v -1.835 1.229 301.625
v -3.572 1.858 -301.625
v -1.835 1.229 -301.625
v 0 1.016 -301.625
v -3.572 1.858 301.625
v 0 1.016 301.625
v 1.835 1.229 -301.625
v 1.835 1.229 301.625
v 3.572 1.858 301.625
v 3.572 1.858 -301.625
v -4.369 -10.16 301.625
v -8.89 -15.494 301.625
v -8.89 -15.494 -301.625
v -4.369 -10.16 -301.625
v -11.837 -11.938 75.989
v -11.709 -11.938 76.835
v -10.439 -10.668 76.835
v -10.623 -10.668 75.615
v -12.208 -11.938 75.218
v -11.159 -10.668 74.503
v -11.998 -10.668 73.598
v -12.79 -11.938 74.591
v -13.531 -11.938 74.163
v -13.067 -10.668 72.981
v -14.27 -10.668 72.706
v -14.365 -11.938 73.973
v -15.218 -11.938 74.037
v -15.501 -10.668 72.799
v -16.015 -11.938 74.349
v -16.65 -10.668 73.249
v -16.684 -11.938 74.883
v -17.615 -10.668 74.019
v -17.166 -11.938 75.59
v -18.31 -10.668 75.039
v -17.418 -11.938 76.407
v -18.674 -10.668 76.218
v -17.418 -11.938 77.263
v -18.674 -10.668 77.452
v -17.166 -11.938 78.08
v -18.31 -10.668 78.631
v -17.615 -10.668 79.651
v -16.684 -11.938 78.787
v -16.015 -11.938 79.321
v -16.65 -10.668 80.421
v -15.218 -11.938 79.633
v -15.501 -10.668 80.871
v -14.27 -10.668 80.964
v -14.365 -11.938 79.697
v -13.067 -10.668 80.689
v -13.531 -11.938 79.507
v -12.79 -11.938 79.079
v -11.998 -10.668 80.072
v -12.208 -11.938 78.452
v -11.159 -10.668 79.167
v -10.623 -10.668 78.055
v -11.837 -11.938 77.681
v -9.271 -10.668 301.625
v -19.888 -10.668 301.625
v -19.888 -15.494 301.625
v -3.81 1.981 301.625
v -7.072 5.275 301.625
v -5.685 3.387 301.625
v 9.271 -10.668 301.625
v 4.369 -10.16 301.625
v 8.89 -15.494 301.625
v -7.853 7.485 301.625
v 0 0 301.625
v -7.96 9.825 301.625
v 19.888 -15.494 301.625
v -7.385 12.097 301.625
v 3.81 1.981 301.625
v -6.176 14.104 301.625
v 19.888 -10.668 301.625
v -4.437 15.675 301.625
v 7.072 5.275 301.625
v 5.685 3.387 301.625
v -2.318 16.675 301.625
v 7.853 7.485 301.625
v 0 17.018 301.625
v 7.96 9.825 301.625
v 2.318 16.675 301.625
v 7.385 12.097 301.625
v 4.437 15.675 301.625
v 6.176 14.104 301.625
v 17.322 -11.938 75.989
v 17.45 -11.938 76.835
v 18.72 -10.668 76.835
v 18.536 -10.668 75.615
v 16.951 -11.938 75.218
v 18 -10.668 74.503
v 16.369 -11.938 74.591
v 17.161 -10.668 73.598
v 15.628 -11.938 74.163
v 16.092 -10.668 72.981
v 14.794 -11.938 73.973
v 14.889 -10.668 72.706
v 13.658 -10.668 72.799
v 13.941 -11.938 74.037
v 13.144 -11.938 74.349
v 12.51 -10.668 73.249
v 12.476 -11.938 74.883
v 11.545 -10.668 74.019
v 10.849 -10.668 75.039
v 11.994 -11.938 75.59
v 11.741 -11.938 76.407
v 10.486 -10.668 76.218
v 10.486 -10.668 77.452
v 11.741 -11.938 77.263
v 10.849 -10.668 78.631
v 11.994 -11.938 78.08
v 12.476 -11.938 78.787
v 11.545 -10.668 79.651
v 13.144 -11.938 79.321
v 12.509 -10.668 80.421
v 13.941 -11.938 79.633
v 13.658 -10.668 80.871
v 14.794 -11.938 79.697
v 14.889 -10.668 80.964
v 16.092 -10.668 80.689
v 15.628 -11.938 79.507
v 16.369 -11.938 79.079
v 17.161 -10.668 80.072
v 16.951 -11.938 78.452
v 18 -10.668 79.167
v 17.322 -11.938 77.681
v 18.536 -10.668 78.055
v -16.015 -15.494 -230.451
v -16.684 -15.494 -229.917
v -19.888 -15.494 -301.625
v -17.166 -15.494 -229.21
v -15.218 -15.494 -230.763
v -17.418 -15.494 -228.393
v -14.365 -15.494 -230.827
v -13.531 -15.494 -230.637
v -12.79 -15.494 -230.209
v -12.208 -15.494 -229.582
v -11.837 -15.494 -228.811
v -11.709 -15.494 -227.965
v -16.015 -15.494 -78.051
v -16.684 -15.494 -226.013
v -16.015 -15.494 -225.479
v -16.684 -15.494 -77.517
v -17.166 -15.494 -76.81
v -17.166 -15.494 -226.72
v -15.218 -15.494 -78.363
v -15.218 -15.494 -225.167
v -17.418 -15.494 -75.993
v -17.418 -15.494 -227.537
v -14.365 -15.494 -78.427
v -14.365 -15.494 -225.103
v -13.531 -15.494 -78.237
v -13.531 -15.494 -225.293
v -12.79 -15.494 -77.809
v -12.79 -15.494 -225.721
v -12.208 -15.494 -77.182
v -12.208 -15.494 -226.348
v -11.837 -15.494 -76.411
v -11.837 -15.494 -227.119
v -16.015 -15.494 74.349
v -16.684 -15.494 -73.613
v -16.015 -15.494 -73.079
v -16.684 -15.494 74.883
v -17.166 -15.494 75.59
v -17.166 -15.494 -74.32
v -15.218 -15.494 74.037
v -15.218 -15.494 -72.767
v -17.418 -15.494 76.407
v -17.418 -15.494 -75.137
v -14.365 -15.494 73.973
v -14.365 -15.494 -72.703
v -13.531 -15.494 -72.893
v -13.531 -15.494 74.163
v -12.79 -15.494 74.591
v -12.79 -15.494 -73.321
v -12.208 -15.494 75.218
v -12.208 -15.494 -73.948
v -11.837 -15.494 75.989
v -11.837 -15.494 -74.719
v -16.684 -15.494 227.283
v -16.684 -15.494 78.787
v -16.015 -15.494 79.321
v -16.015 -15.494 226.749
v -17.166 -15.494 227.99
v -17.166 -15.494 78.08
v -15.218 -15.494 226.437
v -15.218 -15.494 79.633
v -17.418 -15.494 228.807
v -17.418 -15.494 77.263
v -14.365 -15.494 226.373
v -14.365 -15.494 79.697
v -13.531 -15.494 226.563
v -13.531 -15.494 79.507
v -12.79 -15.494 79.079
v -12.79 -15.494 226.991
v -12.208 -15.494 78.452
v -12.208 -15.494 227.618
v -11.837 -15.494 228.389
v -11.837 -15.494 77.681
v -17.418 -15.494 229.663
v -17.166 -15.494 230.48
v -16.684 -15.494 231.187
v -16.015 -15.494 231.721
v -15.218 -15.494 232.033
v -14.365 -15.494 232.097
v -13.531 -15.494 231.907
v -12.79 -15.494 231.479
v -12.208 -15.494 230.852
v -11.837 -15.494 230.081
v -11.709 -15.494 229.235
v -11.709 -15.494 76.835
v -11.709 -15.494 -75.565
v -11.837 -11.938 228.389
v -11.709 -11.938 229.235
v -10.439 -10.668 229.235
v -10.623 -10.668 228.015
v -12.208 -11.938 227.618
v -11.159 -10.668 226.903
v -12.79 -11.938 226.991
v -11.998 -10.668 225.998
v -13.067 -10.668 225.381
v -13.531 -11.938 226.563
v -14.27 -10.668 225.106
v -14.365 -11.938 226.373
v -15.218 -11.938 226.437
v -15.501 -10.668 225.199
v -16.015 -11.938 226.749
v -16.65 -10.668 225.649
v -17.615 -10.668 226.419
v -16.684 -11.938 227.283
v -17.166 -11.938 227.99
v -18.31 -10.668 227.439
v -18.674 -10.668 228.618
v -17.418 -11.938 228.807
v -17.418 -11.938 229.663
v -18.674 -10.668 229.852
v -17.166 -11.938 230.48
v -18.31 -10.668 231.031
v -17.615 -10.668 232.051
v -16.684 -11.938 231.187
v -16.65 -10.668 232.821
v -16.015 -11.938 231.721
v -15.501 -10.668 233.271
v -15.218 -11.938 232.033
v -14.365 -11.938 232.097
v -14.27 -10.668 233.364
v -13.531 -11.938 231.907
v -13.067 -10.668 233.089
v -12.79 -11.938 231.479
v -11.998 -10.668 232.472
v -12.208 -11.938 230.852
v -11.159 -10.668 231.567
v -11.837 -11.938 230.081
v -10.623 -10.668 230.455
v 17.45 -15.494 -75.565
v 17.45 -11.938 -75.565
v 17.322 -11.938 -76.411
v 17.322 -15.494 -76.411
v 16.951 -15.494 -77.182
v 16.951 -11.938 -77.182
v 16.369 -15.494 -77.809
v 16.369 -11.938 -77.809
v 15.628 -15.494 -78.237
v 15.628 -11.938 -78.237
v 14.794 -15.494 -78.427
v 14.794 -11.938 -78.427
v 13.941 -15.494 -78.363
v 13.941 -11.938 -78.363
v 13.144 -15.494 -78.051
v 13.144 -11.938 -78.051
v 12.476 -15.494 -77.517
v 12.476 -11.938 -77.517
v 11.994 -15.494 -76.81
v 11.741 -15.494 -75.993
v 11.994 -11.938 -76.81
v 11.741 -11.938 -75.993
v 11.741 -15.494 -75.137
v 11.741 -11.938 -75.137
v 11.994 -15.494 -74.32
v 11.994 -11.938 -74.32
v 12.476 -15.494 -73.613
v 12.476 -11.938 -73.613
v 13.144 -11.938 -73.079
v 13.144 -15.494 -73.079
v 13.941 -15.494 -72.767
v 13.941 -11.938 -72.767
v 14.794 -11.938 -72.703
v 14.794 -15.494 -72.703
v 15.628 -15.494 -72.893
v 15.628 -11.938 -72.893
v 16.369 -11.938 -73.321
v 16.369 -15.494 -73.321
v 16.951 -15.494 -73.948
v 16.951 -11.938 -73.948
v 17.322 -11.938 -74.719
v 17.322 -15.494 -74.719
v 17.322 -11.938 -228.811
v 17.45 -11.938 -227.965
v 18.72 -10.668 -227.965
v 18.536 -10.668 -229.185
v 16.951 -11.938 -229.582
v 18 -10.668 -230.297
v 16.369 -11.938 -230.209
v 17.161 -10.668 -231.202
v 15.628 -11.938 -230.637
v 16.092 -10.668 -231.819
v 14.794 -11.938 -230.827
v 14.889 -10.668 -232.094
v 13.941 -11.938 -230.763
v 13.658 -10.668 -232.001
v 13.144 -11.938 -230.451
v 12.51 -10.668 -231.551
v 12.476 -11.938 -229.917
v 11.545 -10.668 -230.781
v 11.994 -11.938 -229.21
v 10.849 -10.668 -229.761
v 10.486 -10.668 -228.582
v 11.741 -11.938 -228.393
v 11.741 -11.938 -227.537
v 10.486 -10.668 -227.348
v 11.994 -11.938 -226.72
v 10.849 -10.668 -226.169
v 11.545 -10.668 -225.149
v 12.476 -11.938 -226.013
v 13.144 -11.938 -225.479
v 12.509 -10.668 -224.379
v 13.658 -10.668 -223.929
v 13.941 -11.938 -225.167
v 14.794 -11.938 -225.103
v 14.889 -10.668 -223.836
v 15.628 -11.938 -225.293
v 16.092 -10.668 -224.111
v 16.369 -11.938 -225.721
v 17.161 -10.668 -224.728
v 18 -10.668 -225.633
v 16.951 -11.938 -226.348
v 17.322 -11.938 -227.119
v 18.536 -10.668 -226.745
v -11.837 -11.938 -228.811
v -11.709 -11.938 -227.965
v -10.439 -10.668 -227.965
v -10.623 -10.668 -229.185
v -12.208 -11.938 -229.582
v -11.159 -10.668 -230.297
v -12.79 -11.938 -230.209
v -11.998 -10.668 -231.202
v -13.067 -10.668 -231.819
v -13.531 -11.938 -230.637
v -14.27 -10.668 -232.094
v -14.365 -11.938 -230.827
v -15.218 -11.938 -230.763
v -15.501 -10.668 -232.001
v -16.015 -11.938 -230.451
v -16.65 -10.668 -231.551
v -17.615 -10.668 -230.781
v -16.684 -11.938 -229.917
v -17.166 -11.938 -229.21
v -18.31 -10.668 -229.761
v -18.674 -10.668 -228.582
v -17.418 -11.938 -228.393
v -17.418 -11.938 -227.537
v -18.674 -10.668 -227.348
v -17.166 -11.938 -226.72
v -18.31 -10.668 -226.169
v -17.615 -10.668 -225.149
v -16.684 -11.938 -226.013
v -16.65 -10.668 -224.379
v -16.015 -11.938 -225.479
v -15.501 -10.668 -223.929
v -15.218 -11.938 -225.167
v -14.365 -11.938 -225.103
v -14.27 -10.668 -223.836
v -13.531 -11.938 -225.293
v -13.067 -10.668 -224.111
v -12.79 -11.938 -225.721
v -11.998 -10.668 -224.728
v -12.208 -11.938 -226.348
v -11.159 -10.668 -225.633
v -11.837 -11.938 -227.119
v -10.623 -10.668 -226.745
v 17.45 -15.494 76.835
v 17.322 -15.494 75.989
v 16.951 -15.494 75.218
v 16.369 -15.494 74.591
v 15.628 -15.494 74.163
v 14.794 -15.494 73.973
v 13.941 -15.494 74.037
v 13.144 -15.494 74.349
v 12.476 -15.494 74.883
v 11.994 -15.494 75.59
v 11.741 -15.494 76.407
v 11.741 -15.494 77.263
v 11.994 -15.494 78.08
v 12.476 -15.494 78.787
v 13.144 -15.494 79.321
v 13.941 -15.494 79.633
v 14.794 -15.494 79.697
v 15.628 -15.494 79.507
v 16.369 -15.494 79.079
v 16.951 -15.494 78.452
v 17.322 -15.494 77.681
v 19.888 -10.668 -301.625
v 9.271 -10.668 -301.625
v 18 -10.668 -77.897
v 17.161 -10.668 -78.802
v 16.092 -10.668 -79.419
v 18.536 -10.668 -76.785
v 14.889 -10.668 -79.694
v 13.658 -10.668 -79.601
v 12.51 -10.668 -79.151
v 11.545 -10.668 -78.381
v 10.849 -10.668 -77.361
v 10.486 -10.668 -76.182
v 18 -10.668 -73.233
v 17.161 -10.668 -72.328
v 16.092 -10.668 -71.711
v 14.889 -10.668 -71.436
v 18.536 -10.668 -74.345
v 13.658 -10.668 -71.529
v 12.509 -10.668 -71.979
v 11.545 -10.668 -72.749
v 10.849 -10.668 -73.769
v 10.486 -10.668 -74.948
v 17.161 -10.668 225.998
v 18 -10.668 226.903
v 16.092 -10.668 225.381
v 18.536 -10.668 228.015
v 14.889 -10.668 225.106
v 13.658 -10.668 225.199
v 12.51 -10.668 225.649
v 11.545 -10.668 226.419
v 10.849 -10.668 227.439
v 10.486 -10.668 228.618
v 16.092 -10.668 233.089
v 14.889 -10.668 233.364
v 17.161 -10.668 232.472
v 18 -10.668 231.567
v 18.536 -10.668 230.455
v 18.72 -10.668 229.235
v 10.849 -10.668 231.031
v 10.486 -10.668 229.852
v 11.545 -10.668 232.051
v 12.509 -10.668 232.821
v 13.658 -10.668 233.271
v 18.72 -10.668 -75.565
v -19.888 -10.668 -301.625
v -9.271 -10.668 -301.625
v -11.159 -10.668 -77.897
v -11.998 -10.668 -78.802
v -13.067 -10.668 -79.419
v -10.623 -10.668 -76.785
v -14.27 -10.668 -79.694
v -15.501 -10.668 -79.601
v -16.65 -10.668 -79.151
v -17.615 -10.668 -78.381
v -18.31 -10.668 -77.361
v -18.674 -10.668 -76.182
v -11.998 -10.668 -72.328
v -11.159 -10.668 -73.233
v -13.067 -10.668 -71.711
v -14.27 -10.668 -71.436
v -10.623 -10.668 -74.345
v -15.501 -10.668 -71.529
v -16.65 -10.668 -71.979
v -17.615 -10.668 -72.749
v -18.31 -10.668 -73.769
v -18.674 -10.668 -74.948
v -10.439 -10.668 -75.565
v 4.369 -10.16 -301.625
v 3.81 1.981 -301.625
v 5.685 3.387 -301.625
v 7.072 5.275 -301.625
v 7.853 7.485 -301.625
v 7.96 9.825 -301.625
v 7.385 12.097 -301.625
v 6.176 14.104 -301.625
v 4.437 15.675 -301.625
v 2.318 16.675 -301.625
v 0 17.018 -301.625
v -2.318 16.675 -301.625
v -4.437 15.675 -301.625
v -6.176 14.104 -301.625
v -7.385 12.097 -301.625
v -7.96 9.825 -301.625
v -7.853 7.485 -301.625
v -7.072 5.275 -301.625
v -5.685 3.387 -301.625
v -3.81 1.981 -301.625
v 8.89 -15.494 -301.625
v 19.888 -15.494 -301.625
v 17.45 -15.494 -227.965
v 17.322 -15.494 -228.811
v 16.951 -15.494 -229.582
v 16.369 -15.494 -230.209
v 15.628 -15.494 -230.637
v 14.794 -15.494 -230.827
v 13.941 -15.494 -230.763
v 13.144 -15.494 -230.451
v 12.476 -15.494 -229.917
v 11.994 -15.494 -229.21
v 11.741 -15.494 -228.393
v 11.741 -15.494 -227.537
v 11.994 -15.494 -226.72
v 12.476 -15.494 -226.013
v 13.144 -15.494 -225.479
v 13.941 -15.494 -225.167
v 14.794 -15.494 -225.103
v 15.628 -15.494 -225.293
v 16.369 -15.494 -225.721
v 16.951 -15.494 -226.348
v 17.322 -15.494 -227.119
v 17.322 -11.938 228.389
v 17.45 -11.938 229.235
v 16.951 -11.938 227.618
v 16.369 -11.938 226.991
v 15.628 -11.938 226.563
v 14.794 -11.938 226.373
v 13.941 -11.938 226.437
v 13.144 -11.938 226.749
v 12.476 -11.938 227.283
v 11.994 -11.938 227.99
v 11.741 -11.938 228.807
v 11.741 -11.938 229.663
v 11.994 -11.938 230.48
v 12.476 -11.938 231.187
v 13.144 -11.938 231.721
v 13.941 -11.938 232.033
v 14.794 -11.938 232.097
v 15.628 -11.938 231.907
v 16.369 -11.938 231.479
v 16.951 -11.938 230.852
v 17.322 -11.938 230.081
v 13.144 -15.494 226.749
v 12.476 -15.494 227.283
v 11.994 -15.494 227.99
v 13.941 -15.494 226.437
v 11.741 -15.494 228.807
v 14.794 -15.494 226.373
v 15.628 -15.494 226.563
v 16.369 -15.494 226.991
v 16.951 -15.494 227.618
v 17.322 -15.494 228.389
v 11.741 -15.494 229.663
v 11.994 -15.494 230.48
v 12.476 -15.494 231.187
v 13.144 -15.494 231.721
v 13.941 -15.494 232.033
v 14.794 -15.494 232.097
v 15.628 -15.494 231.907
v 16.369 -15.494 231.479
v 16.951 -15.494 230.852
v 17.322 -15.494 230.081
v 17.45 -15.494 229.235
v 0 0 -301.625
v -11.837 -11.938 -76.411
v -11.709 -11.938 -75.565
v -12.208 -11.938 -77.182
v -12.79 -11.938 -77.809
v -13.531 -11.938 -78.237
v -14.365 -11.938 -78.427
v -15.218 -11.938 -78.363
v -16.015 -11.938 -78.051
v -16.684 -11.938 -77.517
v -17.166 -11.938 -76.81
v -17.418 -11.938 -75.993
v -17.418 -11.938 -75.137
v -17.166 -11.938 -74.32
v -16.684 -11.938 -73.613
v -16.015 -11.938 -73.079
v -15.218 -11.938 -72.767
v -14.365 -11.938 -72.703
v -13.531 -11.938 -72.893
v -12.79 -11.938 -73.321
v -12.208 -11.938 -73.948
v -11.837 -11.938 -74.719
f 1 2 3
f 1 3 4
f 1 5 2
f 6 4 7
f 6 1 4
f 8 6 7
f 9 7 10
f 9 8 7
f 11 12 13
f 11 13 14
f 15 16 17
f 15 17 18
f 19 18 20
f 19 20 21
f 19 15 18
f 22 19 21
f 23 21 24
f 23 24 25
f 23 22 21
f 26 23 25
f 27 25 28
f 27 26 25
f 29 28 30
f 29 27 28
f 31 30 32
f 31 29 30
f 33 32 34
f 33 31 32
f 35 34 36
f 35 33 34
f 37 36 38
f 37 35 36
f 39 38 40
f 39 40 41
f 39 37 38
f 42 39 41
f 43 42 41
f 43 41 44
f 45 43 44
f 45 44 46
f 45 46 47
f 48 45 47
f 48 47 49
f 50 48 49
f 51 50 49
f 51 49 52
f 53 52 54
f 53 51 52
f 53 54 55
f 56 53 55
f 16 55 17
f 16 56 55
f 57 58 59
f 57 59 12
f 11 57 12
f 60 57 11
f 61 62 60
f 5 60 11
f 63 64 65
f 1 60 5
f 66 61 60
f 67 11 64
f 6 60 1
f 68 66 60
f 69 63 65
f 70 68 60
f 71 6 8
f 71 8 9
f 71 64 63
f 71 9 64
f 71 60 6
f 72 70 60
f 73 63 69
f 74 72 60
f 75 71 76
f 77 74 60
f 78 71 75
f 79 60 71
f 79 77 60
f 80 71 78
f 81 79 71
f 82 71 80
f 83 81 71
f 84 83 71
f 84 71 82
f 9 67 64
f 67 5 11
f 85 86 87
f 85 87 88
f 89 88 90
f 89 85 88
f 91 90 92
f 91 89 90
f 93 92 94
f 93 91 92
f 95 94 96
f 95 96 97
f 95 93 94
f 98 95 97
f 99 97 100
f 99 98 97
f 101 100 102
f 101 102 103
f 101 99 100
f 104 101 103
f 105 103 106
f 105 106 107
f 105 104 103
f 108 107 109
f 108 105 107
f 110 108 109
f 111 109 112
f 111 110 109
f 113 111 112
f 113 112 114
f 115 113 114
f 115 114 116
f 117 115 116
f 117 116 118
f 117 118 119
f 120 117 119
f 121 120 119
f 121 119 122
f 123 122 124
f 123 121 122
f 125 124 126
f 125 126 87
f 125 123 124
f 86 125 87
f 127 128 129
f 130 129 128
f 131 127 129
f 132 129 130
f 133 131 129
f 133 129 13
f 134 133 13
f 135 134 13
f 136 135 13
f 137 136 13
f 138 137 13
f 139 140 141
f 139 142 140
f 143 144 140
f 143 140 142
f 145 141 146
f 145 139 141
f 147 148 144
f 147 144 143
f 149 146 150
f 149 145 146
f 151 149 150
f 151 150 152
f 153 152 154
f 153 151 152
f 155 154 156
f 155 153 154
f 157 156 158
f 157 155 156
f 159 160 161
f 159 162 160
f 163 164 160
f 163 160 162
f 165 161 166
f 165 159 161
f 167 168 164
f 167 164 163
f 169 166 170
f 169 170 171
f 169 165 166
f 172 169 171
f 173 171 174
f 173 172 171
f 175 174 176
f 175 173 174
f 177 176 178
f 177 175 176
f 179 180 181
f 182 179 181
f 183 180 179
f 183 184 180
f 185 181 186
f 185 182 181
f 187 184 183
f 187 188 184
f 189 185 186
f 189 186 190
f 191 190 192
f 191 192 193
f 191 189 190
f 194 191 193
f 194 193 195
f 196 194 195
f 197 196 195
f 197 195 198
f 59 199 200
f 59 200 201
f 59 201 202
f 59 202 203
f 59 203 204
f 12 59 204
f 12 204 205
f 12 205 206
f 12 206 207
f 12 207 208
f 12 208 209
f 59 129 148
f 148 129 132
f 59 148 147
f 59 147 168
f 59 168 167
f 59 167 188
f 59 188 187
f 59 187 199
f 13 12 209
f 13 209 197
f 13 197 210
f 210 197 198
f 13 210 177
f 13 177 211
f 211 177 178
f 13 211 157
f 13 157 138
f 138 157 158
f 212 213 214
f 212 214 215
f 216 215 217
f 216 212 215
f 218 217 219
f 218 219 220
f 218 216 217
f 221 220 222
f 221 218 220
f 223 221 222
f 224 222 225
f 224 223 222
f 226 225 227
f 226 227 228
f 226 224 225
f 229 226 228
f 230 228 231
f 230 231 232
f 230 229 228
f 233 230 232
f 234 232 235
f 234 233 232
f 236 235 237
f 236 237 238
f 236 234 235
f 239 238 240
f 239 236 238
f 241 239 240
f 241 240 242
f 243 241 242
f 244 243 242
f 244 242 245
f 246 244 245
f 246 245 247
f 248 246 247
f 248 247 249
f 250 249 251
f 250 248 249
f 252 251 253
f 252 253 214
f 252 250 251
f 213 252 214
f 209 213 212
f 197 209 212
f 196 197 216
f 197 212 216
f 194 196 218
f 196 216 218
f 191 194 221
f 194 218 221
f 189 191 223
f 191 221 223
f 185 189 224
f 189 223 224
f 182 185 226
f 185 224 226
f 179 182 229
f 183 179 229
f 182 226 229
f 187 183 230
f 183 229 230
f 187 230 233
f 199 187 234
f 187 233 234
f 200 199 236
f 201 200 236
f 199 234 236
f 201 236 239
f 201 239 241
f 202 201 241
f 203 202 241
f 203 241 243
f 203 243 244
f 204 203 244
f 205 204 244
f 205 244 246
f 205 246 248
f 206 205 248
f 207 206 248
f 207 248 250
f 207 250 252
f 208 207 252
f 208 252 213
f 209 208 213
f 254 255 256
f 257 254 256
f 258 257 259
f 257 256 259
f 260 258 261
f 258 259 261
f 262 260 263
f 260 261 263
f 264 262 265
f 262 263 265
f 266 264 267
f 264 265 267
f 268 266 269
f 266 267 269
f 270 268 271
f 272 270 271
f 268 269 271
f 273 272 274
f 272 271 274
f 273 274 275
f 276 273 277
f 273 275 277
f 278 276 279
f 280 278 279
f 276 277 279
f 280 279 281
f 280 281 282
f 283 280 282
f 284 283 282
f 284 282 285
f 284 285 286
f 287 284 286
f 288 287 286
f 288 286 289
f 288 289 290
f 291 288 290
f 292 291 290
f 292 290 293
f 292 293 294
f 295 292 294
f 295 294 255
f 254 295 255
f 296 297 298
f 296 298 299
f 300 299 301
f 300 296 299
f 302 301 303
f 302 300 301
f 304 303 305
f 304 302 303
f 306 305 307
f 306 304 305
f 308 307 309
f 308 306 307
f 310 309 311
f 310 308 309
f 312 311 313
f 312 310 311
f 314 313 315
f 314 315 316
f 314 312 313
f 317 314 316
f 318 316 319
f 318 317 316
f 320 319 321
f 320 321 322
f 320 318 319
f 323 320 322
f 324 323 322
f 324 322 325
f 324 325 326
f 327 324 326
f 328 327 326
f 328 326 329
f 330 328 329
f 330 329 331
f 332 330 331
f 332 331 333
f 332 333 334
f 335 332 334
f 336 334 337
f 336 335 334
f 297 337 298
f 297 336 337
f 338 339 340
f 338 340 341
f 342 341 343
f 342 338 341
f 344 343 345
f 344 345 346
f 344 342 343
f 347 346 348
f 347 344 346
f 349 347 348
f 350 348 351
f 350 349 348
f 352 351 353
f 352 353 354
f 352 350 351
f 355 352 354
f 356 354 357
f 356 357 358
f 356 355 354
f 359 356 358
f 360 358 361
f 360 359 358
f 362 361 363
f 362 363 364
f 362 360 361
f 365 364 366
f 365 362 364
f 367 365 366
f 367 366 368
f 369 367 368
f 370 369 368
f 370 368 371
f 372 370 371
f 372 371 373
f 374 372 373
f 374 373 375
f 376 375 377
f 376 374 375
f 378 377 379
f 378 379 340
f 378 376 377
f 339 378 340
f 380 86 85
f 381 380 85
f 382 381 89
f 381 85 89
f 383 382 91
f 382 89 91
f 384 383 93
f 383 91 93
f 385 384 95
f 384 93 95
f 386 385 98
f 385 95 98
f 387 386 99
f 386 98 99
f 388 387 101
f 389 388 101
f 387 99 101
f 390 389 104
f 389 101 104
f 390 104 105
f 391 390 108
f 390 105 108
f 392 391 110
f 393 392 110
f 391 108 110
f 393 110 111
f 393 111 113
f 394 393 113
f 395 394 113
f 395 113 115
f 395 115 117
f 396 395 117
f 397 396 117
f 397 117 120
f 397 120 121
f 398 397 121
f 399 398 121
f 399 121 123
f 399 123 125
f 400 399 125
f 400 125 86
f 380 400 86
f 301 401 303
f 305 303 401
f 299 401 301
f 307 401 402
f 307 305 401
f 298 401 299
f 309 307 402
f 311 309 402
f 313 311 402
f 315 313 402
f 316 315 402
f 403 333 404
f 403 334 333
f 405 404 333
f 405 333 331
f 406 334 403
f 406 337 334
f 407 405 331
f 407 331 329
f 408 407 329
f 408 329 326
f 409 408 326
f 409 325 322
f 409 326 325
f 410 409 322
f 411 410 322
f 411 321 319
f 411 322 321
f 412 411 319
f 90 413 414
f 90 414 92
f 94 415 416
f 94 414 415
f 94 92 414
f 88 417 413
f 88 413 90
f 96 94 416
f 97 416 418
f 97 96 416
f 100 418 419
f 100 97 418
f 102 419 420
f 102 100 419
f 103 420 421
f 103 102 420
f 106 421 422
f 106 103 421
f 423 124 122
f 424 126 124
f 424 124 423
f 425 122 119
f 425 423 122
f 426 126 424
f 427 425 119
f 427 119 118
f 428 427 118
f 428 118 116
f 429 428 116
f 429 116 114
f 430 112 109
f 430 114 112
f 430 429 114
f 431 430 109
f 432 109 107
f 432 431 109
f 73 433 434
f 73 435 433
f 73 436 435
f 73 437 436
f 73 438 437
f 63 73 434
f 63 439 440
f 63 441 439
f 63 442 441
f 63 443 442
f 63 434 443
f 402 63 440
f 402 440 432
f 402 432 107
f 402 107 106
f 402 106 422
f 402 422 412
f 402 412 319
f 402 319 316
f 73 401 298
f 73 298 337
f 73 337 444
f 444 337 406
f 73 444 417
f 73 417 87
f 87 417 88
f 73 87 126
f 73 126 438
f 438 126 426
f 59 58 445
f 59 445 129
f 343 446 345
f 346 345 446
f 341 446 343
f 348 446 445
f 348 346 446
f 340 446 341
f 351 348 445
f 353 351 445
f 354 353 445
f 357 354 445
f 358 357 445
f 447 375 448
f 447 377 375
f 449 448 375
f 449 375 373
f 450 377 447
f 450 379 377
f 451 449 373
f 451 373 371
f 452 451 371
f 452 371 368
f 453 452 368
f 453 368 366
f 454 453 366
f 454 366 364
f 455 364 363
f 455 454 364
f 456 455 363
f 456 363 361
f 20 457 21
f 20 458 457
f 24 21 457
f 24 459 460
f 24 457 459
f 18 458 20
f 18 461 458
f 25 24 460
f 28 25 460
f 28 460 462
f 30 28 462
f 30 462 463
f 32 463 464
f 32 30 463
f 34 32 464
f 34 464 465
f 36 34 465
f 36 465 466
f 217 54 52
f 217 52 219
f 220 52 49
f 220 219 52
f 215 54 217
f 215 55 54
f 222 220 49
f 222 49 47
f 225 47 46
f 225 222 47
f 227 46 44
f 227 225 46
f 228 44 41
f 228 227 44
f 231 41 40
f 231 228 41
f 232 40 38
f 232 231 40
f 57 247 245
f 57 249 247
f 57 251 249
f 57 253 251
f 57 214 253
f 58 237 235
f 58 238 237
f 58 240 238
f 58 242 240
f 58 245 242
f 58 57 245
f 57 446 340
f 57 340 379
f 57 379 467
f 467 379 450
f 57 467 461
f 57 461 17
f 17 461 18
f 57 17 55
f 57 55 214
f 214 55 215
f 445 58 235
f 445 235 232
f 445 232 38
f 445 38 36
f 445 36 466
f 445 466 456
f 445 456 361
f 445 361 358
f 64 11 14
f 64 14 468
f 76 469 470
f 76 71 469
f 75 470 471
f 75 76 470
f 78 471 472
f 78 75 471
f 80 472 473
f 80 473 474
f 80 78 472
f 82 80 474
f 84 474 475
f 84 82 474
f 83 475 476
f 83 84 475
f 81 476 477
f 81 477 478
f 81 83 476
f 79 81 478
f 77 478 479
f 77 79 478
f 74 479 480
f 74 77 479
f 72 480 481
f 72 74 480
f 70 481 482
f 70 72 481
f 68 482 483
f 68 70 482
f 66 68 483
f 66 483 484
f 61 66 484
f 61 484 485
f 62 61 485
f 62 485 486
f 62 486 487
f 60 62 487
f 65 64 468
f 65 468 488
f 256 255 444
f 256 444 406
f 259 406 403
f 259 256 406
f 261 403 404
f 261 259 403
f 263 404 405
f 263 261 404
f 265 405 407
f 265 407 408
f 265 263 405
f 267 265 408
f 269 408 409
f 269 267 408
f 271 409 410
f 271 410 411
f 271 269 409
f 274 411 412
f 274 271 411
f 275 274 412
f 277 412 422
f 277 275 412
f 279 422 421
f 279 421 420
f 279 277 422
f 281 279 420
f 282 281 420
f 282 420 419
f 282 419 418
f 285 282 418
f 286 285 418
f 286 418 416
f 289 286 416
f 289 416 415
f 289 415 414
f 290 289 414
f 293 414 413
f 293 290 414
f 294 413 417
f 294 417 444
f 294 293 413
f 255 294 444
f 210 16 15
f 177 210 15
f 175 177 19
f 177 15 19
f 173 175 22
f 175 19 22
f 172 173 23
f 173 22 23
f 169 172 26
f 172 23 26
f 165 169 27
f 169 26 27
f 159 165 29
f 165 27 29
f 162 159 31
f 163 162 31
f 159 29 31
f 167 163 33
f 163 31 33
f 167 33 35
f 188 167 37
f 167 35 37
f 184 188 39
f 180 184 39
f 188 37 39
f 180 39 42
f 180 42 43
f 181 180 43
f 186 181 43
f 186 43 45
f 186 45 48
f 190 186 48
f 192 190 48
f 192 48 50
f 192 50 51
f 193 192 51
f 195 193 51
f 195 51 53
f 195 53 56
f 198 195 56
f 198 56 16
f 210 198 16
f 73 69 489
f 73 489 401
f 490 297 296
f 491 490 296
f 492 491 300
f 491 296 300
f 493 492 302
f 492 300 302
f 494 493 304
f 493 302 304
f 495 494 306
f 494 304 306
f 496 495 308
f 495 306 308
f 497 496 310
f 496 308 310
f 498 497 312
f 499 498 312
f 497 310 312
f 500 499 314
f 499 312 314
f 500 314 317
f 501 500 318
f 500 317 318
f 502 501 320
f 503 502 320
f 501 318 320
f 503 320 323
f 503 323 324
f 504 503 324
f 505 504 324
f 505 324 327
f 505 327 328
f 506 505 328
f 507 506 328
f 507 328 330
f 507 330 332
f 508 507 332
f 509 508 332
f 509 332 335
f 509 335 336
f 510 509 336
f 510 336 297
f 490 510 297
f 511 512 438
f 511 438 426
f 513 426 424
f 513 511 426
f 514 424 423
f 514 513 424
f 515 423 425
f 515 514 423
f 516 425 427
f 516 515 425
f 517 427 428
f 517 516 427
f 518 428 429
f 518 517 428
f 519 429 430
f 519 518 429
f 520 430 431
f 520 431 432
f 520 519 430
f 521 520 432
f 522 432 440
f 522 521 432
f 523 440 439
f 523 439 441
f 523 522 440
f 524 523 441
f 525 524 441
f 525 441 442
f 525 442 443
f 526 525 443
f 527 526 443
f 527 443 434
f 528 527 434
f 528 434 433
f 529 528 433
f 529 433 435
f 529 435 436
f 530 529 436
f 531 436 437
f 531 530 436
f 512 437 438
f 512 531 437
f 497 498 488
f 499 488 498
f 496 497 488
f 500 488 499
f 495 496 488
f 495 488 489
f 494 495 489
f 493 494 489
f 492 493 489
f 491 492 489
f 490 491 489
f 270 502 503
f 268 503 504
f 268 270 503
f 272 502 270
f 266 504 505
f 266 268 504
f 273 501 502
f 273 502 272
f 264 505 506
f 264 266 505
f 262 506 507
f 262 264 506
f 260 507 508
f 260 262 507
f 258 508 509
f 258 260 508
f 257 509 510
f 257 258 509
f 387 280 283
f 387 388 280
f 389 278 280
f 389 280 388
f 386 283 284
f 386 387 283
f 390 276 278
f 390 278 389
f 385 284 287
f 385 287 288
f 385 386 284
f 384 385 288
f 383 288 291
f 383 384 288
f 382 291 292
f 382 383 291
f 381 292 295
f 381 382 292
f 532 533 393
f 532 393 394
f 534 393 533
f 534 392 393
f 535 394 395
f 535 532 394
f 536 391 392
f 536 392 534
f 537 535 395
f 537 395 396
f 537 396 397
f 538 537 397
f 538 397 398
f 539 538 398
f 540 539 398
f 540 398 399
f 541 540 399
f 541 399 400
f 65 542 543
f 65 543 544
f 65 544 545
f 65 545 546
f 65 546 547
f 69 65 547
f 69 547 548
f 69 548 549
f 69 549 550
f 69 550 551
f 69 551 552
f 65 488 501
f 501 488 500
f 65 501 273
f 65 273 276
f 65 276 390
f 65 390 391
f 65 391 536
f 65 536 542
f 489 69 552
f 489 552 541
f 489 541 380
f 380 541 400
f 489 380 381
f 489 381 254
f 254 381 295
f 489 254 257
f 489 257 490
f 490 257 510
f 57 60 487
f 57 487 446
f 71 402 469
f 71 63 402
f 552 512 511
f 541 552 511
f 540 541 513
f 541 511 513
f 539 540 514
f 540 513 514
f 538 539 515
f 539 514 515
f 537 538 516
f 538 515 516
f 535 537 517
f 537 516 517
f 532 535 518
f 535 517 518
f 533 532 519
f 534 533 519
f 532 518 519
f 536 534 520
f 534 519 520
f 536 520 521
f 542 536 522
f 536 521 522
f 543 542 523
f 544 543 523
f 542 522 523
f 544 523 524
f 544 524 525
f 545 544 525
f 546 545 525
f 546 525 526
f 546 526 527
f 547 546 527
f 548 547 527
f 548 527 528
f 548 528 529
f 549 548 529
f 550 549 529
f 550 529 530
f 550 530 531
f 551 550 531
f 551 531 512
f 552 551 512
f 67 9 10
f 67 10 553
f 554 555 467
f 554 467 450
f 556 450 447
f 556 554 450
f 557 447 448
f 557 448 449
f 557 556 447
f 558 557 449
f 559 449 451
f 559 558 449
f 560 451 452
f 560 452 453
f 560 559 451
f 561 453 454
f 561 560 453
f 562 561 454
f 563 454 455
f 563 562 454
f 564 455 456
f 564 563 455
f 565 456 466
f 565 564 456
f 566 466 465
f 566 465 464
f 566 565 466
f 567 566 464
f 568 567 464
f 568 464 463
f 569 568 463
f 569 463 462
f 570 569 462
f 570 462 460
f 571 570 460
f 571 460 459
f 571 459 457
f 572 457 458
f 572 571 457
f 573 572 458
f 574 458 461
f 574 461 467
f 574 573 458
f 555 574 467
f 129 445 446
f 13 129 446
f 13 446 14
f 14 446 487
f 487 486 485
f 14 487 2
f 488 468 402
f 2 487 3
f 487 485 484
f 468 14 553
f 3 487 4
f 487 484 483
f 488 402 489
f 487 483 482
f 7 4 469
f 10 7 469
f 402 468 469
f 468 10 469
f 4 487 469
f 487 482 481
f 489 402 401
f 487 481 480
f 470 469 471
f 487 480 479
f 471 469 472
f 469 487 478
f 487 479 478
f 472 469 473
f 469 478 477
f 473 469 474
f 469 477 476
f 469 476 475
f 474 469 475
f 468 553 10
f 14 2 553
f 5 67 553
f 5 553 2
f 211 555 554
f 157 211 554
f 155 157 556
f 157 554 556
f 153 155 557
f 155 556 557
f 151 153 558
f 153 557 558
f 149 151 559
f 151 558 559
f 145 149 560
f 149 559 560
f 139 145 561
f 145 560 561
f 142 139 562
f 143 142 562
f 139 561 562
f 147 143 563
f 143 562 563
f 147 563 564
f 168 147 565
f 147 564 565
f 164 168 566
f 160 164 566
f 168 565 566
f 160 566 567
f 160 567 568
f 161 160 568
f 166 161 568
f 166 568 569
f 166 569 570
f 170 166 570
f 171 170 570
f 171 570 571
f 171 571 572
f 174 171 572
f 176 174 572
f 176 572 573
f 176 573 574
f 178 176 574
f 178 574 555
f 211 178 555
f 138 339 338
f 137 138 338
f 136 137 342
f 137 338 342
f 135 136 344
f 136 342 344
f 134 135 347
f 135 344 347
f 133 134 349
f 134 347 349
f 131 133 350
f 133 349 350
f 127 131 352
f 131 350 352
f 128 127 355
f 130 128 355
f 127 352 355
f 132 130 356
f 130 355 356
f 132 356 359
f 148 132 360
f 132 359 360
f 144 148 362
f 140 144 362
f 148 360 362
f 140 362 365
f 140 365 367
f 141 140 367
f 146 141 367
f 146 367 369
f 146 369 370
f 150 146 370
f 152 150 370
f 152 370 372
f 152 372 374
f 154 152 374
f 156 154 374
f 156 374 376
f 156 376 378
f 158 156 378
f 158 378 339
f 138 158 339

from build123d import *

# Parameters (mm, degrees)
SKETCH1_R           = 8.001
BOSS_EXTRUDE1_DEPTH = 301.625
SKETCH5_R           = 2.8702
CUT_EXTRUDE1_DEPTH  = 5.826
CHAMFER1_SIZE       = 1.27


with BuildPart() as part:
    # Sketch1 → Boss-Extrude1 (new body, symmetric)
    with BuildSketch(Plane.XY):
        with Locations((0, 9.017)):
            Circle(SKETCH1_R)
        Polygon((-19.8882, -15.494), (-8.89, -15.494), (-4.3688, -10.16), (4.3688, -10.16), (8.89, -15.494), (19.8882, -15.494), (19.8882, -10.668), (9.271, -10.668), (3.81, 1.981383396), (0, 0), (-3.81, 1.981383396), (-9.271, -10.668), (-19.8882, -10.668), align=None)
    extrude(amount=BOSS_EXTRUDE1_DEPTH, both=True)

    # Sketch5 → Cut-Extrude1 (cut, through all)
    with BuildSketch(Plane(origin=(0, -10.668, 0), x_dir=(1, 0, 0), z_dir=(0, 1, 0))):
        with Locations((14.5796, -229.235)):
            Circle(SKETCH5_R)
        with Locations((-14.5796, -229.235)):
            Circle(SKETCH5_R)
        with Locations((-14.5796, -76.835)):
            Circle(SKETCH5_R)
        with Locations((14.5796, -76.835)):
            Circle(SKETCH5_R)
        with Locations((-14.5796, 75.565)):
            Circle(SKETCH5_R)
        with Locations((14.5796, 75.565)):
            Circle(SKETCH5_R)
        with Locations((-14.5796, 227.965)):
            Circle(SKETCH5_R)
        with Locations((14.5796, 227.965)):
            Circle(SKETCH5_R)
    extrude(amount=-CUT_EXTRUDE1_DEPTH, mode=Mode.SUBTRACT)

    # Chamfer1
    chamfer1_edges = [part.edges().sort_by_distance(p)[0] for p in [
        (11.7094, -10.668, -75.565),
        (-17.4498, -10.668, 76.835),
        (11.7094, -10.668, 76.835),
        (-17.4498, -10.668, 229.235),
        (-17.4498, -10.668, -227.965),
        (11.7094, -10.668, -227.965),
        (-17.4498, -10.668, -75.565),
        (11.7094, -10.668, 229.235),
    ]]
    chamfer(chamfer1_edges, length=CHAMFER1_SIZE)


solid = part.part
